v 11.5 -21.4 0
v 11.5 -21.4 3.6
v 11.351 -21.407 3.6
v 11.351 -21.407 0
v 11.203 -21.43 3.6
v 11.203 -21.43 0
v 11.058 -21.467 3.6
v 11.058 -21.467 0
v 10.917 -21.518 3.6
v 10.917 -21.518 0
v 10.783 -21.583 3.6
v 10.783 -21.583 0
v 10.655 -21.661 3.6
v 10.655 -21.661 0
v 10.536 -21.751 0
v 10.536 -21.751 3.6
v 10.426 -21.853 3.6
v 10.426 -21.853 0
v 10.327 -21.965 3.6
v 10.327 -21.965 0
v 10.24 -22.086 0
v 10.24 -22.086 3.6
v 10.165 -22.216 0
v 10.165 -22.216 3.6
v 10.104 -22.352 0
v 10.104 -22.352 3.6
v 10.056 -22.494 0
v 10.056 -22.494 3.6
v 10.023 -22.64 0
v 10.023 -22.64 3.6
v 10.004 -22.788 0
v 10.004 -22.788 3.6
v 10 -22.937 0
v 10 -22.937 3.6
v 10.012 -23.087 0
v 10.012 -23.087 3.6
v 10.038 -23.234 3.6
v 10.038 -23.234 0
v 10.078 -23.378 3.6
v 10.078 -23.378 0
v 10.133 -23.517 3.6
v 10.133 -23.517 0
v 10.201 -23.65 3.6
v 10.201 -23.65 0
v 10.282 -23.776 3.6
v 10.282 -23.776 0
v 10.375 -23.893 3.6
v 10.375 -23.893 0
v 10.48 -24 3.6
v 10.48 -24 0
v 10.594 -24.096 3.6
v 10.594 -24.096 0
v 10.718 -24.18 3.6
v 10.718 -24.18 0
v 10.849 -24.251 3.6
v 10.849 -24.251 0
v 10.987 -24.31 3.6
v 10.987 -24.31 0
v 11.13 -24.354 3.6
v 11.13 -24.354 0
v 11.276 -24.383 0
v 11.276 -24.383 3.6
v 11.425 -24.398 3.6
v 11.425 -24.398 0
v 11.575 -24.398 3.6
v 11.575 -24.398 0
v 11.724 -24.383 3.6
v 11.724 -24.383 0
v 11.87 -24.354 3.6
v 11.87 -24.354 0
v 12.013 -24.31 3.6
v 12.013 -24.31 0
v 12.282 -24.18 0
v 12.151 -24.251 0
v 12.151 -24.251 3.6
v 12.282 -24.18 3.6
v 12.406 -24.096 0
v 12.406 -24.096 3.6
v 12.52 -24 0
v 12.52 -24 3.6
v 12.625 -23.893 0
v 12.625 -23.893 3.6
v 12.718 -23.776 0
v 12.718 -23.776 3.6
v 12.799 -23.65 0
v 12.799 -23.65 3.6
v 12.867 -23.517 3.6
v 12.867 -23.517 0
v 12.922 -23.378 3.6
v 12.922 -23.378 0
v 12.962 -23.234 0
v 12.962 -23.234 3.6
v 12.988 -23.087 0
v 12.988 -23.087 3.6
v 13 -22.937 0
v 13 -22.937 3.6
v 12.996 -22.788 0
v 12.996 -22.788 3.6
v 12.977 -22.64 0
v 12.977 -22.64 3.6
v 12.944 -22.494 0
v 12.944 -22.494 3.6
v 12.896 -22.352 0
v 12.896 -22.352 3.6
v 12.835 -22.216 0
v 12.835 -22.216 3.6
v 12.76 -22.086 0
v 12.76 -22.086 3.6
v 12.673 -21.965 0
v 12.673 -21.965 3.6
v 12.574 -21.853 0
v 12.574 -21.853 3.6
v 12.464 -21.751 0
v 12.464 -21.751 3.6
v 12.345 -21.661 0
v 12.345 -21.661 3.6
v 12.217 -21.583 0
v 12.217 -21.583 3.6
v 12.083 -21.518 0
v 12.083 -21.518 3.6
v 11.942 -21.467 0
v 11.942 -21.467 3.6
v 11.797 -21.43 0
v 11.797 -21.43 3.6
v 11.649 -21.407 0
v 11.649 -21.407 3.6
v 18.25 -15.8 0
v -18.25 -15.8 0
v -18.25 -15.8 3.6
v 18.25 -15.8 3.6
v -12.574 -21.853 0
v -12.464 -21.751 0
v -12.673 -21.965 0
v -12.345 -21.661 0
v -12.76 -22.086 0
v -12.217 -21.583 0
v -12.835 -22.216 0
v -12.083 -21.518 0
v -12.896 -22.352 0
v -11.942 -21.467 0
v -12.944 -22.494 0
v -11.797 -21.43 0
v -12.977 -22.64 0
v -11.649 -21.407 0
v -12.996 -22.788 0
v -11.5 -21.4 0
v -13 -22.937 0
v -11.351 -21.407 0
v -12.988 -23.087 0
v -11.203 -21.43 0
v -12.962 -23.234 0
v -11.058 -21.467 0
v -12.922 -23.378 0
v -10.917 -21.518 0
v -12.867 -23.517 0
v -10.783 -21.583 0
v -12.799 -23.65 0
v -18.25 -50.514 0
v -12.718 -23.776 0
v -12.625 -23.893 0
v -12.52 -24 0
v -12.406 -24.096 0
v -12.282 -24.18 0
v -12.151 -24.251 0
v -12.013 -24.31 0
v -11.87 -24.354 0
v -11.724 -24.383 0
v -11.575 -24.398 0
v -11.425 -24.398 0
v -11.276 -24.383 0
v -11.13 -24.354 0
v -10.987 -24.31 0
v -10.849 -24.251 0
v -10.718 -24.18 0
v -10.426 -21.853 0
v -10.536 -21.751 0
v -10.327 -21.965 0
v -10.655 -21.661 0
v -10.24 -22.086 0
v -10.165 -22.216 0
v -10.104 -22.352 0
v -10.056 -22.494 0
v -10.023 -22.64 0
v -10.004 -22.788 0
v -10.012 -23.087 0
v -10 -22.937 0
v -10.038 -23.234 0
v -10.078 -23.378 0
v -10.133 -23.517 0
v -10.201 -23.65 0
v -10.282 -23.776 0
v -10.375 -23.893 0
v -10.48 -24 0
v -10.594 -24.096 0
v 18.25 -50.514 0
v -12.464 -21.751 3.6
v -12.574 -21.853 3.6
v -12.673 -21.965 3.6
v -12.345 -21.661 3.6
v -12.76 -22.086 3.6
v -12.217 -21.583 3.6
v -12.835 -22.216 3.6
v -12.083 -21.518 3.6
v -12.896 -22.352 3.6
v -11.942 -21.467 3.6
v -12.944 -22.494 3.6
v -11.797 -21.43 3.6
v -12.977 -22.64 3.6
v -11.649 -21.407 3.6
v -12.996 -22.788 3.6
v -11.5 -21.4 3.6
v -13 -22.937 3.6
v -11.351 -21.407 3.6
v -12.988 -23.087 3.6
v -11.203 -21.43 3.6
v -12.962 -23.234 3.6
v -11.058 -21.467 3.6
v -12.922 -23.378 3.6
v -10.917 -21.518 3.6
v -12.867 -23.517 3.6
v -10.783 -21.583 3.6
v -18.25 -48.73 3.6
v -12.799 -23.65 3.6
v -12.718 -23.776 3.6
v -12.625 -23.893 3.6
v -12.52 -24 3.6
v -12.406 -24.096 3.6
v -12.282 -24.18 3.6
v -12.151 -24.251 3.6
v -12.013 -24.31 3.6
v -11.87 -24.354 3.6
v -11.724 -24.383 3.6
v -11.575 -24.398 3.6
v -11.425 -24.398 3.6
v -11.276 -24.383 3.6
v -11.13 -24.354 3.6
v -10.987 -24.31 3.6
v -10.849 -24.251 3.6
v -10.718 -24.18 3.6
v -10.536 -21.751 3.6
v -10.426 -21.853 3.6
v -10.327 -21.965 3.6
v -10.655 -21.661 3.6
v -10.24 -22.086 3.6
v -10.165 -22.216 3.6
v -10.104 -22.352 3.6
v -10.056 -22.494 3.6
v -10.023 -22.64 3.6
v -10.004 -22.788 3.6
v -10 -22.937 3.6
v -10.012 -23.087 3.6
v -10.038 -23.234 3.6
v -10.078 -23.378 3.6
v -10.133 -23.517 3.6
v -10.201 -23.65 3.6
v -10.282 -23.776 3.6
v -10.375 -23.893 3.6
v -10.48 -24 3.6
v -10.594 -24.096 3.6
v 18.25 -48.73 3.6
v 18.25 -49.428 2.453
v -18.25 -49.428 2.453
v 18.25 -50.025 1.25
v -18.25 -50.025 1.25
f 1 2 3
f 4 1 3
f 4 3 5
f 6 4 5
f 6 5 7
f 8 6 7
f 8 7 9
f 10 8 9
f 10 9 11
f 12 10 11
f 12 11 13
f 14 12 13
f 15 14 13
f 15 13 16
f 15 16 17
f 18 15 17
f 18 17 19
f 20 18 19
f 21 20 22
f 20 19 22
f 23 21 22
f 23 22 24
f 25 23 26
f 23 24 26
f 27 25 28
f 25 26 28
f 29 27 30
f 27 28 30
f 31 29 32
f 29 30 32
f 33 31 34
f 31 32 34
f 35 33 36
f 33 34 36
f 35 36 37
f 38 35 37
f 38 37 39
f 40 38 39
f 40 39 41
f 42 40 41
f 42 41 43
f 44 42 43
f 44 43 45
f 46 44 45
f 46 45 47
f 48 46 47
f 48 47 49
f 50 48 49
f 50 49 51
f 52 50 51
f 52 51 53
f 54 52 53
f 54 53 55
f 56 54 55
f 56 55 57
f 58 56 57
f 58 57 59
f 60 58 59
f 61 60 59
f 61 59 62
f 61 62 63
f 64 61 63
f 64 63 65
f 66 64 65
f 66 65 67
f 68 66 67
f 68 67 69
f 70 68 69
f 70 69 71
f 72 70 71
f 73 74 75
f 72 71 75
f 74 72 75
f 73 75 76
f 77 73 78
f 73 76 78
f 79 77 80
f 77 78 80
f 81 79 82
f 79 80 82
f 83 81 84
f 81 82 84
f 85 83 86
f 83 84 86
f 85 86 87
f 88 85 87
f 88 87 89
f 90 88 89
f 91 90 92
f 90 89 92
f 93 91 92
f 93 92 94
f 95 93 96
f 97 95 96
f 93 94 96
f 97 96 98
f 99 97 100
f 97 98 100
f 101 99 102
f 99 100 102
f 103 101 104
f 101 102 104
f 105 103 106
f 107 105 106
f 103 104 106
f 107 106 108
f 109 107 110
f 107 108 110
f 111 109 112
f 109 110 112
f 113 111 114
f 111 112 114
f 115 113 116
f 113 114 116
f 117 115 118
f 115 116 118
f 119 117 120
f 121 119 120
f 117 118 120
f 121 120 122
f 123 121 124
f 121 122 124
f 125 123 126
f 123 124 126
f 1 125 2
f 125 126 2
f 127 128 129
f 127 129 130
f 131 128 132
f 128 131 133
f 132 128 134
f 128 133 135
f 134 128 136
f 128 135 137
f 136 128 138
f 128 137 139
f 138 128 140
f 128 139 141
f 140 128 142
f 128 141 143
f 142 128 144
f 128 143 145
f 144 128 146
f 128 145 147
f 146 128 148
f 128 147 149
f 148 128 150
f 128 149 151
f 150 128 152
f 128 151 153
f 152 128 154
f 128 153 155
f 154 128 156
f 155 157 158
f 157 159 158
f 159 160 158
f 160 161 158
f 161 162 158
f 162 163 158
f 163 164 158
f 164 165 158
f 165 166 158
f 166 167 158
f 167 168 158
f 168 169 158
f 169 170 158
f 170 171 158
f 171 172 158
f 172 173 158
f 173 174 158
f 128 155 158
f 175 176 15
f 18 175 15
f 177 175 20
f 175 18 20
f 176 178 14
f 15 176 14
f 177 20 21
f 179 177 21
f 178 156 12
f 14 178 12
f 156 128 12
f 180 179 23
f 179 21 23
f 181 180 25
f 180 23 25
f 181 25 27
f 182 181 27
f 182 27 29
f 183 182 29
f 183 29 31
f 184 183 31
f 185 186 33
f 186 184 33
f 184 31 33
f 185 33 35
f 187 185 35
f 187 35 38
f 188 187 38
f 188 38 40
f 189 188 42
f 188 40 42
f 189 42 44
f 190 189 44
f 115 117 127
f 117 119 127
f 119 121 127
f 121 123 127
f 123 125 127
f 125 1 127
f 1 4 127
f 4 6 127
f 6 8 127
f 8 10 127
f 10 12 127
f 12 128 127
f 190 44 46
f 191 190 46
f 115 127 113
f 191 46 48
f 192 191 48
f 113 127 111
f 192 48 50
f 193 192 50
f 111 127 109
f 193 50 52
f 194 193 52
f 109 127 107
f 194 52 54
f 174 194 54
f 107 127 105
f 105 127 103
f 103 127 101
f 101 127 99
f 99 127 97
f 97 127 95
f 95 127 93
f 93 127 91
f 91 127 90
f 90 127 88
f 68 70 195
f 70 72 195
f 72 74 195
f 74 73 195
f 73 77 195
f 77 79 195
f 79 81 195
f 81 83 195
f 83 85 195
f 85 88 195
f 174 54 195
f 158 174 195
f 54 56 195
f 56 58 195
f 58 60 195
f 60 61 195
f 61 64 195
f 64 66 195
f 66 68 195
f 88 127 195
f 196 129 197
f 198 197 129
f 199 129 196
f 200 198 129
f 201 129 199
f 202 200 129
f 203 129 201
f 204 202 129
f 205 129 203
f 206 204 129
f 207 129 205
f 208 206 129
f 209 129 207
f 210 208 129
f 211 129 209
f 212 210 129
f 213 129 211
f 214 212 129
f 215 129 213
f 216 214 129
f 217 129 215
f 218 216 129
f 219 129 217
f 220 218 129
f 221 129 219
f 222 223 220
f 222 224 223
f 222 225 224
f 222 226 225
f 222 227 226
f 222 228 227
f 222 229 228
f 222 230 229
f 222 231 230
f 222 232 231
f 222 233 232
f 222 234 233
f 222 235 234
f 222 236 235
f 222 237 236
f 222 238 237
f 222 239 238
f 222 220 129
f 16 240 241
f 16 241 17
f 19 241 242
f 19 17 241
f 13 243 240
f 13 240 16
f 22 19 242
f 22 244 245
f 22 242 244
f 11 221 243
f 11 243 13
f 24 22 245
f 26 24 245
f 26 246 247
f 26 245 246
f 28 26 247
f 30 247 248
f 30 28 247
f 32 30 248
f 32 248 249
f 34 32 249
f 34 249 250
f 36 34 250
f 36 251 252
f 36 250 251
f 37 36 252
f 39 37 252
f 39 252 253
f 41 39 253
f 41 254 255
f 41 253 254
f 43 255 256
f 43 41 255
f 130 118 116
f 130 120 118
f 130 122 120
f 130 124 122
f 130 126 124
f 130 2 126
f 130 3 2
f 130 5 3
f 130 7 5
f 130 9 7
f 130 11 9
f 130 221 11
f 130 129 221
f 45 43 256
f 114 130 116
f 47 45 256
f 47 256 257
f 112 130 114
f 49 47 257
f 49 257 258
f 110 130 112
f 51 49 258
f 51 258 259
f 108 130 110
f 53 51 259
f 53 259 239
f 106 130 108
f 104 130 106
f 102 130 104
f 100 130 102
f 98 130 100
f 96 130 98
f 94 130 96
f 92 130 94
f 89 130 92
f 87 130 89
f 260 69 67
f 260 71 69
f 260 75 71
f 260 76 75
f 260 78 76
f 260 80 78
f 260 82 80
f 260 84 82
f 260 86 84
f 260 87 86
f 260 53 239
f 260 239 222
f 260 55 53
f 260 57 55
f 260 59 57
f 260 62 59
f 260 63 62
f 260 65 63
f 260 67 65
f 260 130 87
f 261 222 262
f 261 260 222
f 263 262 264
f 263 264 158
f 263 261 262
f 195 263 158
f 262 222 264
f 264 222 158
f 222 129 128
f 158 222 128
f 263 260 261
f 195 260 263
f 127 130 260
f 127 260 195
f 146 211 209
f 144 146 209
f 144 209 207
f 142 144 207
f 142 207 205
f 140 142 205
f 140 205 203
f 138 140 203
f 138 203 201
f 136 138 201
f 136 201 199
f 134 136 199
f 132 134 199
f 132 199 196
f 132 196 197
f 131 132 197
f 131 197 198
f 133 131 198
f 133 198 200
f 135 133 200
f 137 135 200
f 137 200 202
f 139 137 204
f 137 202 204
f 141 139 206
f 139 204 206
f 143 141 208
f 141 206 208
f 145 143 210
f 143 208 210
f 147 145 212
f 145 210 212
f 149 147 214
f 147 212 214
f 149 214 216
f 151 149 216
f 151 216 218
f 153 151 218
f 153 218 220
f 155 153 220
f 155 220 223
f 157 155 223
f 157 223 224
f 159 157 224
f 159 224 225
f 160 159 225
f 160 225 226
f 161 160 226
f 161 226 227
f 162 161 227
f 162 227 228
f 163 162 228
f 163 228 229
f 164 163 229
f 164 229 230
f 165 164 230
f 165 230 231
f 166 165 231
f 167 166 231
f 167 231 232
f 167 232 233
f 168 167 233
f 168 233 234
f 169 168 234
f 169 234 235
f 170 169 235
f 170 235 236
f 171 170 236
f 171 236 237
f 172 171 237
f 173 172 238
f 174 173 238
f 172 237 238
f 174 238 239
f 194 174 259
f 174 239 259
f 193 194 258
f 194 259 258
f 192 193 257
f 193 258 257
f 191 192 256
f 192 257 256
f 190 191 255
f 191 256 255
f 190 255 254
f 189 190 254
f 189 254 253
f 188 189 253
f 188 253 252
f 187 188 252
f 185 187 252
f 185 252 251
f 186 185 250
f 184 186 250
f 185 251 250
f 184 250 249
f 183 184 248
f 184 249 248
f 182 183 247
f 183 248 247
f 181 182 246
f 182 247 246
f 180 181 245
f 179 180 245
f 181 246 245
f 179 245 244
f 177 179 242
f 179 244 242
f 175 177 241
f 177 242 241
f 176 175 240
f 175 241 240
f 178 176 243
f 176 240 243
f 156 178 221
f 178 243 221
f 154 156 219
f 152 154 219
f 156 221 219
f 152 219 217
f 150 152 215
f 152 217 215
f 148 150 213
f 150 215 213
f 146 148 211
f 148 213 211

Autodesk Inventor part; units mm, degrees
ref_plane "YZ Plane" through (0, 0, 0) normal (1, 0, 0) x (0, 1, 0)
ref_plane "XZ Plane" through (0, 0, 0) normal (0, 1, 0) x (-1, 0, 0)
ref_plane "XY Plane" through (0, 0, 0) normal (0, 0, 1) x (1, 0, 0)
sketch "Sketch1" plane through (0, 0, 0) normal (0, 0, 1) x (1, 0, 0)
  line L0 (-50, 48) -> (-50, -15.8) projected
  line L1 (-50, -15.8) -> (-18.25, -15.8) projected
  line L2 (-18.25, -15.8) -> (-18.25, -48) projected
  line L3 (-18.25, -48) -> (18.25, -48) projected
  line L4 (18.25, -48) -> (18.25, -15.8) projected
  line L5 (18.25, -15.8) -> (50, -15.8) projected
  line L6 (50, -15.8) -> (50, 48) projected
  line L7 (50, 48) -> (-50, 48) projected
  line L8 (18.25, -48) -> (-18.25, -48)
  line L9 (-18.25, -48) -> (-18.25, -15.8)
  line L10 (-18.25, -15.8) -> (18.25, -15.8)
  line L11 (18.25, -15.8) -> (18.25, -48)
  point P0 (0, 0)
extrude "Extrusion1" add sketch "Sketch1" along normal blind 4.6 contours L10 L4 L3 L2
sketch "Sketch2" plane through (0, 0, 4.6) normal (0, 0, 1) x (1, 0, 0)
  line L0 (-18.25, -15.8) -> (-18.25, -48) projected
  line L1 (-18.25, -48) -> (18.25, -48) projected
  line L2 (18.25, -48) -> (18.25, -15.8) projected
  line L3 (18.25, -15.8) -> (-18.25, -15.8) projected
  point P0 (0, 0)
extrude "Extrusion2" cut sketch "Sketch2" against normal blind 1
sketch "Sketch3" plane through (0, 0, 0) normal (0, 0, -1) x (-1, 0, 0)
  line L0 (4.9, -29.9) -> (18.1, -29.9)
  line L1 (4.9, -41.9) -> (18.1, -41.9)
  line L2 (-4.9, -41.9) -> (-18.1, -41.9)
  line L3 (-4.9, -29.9) -> (-18.1, -29.9)
  line L4 (11.5, -29.9) -> (11.5, -22.9)
  line L5 (-11.5, -29.9) -> (-11.5, -22.9)
  line L6 (18.25, -15.8) -> (18.25, -48) projected
  line L7 (-18.25, -15.8) -> (18.25, -15.8) projected
  line L8 (-18.25, -48) -> (-18.25, -15.8) projected
  line L9 (18.25, -48) -> (-18.25, -48) projected
  line L10 (-18.25, -15.8) -> (18.25, -15.8) projected
  line L11 (0, -15.8) -> (0, -48)
  line L12 (18.25, -48) -> (-18.25, -48) projected
  line L13 (0, -48) -> (0, -43.5)
  point P0 (0, 0)
  dimension "d4" = 7
  dimension "d5" = 4.5
hole "Hole1" at (-11.5, -22.9, 0) at (11.5, -22.9, 0) direction (0, 0, 1) diameter 3 end through all
sketch "Sketch4" plane through (18.25, -48, 0) normal (1, 0, 0) x (0, 0, -1)
  arc A0 (-8.6, 4.7781) -> (-3.6, -0.73) centre (5, 12.1) ccw projected
  circle A1 centre (5, 12.1) radius 15.4457
  line L0 (-3.6, 32.2) -> (-3.6, 0) projected
  line L1 (0, 0) -> (-3.6, 0) projected
  line L2 (0, 0) -> (0, 32.2) projected
  line L3 (0, 32.2) -> (-3.6, 32.2) projected
  line L4 (0, 0) -> (0, -2.514)
  line L5 (-3.6, 0) -> (-3.6, -1.081)
  point P0 (0, 48)
  point P1 (-3.6, -0.73)
extrude "Extrusion3" add sketch "Sketch4" against normal up to surface (36.5 mm away) contours L5 L1 L4 A1
properties part number "podpora silników" material "Lead"
